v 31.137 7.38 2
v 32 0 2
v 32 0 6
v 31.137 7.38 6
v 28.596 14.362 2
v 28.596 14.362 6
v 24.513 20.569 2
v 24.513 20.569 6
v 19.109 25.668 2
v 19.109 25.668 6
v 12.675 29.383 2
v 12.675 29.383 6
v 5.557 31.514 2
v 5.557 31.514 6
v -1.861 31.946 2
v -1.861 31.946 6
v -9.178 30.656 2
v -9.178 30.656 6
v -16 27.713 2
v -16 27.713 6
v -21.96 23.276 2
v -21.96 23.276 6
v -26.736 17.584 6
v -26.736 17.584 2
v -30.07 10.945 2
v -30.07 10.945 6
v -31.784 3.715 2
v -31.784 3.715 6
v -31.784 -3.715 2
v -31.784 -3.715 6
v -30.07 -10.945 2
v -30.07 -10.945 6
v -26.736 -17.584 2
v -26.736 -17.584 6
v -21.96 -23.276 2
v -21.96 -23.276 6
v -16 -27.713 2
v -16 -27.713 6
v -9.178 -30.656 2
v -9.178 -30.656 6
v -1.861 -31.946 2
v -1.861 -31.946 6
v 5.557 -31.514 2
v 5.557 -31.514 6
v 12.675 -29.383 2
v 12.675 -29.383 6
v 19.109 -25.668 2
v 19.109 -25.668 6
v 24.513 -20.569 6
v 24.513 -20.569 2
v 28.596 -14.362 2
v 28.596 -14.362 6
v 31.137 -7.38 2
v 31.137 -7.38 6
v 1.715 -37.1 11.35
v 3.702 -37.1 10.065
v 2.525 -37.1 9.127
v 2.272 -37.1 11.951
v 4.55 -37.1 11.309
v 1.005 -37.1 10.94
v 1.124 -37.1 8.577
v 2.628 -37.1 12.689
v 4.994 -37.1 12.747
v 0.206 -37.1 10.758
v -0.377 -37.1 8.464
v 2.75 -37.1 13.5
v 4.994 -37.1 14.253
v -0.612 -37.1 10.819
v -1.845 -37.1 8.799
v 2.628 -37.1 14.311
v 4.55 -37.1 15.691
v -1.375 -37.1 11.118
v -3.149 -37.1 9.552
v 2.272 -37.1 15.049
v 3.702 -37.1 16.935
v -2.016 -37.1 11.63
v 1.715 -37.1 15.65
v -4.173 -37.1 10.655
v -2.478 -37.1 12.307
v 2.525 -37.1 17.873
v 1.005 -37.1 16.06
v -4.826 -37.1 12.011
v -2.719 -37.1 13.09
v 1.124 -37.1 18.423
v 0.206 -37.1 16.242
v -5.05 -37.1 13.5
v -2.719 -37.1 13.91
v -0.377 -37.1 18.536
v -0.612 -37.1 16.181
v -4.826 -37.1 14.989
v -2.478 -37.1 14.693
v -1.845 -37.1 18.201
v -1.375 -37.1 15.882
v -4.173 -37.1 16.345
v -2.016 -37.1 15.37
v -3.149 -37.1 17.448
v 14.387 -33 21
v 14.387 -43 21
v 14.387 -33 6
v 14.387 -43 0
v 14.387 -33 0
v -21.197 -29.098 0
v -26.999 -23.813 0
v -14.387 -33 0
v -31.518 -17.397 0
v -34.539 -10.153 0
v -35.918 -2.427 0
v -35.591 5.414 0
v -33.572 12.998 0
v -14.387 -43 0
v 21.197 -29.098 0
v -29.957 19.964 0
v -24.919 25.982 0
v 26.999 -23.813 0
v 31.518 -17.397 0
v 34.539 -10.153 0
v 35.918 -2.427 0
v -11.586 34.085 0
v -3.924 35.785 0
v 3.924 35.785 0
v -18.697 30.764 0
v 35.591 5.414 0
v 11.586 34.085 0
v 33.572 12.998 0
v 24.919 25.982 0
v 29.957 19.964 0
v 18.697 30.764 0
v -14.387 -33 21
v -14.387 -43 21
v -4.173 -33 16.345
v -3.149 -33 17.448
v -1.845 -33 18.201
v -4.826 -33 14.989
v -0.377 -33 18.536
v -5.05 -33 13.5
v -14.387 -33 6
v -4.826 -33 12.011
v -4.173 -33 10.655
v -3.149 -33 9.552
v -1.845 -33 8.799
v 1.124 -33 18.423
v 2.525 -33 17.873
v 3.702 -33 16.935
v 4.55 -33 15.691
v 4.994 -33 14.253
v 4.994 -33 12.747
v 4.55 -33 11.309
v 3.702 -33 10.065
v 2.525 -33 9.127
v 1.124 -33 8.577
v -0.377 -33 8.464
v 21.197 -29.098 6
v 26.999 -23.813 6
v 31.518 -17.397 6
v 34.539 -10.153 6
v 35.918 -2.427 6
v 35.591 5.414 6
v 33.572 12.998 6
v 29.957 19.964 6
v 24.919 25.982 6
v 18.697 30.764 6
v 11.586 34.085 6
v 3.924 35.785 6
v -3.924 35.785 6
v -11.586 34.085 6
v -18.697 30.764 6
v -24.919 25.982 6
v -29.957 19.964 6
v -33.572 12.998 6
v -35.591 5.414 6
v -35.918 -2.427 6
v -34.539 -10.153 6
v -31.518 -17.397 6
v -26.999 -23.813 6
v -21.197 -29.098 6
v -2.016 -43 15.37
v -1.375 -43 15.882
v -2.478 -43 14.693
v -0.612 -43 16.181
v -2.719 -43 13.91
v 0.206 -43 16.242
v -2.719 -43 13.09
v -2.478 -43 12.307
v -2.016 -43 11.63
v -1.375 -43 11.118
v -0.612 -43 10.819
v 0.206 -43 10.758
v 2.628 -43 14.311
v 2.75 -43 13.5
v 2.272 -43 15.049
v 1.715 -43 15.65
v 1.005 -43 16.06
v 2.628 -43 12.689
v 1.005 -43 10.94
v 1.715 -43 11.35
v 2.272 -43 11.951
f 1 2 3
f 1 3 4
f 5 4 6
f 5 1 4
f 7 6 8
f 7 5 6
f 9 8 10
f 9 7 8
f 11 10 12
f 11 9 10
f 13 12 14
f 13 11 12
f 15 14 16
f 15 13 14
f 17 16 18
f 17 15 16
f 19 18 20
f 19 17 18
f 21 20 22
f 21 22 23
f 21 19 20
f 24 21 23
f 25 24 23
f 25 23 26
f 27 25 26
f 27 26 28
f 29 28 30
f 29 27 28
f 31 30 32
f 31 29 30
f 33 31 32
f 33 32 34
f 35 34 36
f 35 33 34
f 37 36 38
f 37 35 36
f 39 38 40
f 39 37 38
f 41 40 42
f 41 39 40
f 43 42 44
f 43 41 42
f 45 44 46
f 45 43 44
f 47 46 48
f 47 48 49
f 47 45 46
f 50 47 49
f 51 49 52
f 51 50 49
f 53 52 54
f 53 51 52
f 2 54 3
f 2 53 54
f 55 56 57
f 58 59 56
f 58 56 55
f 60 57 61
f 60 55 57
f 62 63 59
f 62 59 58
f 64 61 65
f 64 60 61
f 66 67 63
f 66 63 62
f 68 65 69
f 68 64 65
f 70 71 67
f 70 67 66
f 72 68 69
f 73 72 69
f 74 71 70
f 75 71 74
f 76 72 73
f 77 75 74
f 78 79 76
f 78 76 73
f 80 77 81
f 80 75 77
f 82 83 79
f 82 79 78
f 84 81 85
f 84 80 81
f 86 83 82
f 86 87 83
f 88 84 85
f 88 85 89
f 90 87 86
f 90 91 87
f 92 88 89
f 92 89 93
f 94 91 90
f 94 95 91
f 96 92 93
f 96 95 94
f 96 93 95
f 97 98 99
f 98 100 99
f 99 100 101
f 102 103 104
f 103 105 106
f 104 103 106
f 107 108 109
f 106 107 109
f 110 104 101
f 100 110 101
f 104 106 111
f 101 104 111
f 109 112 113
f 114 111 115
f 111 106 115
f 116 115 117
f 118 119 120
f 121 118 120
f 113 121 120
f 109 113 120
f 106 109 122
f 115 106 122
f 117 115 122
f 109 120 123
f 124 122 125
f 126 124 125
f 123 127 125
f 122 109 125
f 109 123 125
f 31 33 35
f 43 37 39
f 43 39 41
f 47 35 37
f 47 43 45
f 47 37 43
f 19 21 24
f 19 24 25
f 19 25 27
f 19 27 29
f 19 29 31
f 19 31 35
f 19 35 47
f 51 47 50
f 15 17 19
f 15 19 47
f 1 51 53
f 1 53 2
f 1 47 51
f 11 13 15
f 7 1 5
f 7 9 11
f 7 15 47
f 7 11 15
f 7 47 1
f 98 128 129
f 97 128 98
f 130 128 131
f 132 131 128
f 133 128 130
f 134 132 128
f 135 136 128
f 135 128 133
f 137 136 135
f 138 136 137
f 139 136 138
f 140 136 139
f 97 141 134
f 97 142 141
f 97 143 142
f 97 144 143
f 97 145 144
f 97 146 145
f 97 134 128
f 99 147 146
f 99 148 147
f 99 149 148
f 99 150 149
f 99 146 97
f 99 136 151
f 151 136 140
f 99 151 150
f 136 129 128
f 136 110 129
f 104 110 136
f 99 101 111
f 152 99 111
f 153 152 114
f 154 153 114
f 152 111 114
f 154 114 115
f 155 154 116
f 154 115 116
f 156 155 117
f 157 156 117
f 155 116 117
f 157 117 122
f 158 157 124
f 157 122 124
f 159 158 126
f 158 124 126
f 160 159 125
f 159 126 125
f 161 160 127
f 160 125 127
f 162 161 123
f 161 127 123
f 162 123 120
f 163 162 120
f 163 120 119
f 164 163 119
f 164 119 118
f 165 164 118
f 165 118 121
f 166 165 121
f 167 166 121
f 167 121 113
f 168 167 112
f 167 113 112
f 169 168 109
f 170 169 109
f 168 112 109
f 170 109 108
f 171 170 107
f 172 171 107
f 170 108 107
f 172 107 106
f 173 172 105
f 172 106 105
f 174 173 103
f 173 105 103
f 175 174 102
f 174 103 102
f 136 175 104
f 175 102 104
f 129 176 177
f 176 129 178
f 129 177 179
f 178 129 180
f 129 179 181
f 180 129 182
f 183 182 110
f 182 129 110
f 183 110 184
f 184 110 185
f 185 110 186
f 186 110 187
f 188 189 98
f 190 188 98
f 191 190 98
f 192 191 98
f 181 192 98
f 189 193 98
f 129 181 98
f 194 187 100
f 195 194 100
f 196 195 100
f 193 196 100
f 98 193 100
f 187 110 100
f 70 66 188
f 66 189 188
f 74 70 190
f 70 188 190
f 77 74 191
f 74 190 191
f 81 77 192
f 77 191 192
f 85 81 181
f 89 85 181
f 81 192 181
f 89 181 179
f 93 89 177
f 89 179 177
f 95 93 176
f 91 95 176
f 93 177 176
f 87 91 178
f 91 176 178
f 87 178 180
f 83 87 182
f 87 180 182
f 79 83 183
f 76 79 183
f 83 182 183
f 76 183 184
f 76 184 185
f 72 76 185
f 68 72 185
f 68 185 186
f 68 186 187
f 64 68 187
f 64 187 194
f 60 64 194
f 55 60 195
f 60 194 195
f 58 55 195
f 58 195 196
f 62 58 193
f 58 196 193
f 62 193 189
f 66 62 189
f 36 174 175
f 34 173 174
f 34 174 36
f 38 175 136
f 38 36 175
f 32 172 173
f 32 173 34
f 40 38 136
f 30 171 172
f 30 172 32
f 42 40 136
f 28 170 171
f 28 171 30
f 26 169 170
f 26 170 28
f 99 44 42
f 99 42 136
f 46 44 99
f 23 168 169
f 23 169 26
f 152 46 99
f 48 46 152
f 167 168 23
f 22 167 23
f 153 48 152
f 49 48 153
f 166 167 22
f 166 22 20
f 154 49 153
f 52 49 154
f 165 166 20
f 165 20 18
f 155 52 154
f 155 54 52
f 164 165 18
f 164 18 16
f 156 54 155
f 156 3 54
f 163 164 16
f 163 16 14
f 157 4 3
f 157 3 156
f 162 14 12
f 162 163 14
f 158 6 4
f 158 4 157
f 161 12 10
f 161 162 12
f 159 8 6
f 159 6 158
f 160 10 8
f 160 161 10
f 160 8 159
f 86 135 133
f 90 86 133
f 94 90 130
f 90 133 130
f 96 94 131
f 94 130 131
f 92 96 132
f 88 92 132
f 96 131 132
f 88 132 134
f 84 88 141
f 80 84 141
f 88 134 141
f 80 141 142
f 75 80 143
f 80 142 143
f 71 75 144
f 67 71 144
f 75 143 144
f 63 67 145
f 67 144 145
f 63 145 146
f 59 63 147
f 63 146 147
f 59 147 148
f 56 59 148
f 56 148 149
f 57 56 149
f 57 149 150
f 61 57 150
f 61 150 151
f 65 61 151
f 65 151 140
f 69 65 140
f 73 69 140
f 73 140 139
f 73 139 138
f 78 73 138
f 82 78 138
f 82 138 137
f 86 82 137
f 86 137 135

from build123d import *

# Parameters (mm, degrees)
PAD_DEPTH        = 2
SKETCH001_R      = 32
PAD001_DEPTH     = 4
SKETCH002_W      = 28.77499
SKETCH002_H      = 10
PAD002_DEPTH     = 15
HOLE_D           = 5.5
HOLE_DEPTH       = 25
HOLE_CBORE_D     = 10.1
HOLE_CBORE_DEPTH = 4.1


with BuildPart() as part:
    # Sketch → Pad (new body)
    with BuildSketch(Plane.XY):
        with BuildLine():
            ThreePointArc((14.387495, -33), (0, 36), (-14.387495, -33))
            Line((-14.387495, -33), (-14.387495, -43))
            Line((-14.387495, -43), (14.387495, -43))
            Line((14.387495, -43), (14.387495, -33))
        make_face()
    extrude(amount=PAD_DEPTH)

    # Sketch001 (on Face6 of Pad) → Pad001 (join)
    with BuildSketch(Plane.XY.offset(2)):
        with BuildLine():
            ThreePointArc((14.387495, -33), (0, 36), (-14.387495, -33))
            Line((-14.387495, -33), (-14.387495, -43))
            Line((-14.387495, -43), (14.387495, -43))
            Line((14.387495, -43), (14.387495, -33))
        make_face()
        Circle(SKETCH001_R, mode=Mode.SUBTRACT)
    extrude(amount=PAD001_DEPTH)

    # Sketch002 (on Face9 of Pad001) → Pad002 (join)
    with BuildSketch(Plane.XY.offset(6)):
        with Locations((0, -38)):
            Rectangle(SKETCH002_W, SKETCH002_H)
    extrude(amount=PAD002_DEPTH)

    # Hole
    with Locations(Plane(origin=(0, -33, 0), x_dir=(-1, 0, 0), z_dir=(0, 1, 0))):
        with Locations((0, 13.5)):
            CounterBoreHole(HOLE_D / 2, HOLE_CBORE_D / 2, HOLE_CBORE_DEPTH, depth=HOLE_DEPTH)


solid = part.part
